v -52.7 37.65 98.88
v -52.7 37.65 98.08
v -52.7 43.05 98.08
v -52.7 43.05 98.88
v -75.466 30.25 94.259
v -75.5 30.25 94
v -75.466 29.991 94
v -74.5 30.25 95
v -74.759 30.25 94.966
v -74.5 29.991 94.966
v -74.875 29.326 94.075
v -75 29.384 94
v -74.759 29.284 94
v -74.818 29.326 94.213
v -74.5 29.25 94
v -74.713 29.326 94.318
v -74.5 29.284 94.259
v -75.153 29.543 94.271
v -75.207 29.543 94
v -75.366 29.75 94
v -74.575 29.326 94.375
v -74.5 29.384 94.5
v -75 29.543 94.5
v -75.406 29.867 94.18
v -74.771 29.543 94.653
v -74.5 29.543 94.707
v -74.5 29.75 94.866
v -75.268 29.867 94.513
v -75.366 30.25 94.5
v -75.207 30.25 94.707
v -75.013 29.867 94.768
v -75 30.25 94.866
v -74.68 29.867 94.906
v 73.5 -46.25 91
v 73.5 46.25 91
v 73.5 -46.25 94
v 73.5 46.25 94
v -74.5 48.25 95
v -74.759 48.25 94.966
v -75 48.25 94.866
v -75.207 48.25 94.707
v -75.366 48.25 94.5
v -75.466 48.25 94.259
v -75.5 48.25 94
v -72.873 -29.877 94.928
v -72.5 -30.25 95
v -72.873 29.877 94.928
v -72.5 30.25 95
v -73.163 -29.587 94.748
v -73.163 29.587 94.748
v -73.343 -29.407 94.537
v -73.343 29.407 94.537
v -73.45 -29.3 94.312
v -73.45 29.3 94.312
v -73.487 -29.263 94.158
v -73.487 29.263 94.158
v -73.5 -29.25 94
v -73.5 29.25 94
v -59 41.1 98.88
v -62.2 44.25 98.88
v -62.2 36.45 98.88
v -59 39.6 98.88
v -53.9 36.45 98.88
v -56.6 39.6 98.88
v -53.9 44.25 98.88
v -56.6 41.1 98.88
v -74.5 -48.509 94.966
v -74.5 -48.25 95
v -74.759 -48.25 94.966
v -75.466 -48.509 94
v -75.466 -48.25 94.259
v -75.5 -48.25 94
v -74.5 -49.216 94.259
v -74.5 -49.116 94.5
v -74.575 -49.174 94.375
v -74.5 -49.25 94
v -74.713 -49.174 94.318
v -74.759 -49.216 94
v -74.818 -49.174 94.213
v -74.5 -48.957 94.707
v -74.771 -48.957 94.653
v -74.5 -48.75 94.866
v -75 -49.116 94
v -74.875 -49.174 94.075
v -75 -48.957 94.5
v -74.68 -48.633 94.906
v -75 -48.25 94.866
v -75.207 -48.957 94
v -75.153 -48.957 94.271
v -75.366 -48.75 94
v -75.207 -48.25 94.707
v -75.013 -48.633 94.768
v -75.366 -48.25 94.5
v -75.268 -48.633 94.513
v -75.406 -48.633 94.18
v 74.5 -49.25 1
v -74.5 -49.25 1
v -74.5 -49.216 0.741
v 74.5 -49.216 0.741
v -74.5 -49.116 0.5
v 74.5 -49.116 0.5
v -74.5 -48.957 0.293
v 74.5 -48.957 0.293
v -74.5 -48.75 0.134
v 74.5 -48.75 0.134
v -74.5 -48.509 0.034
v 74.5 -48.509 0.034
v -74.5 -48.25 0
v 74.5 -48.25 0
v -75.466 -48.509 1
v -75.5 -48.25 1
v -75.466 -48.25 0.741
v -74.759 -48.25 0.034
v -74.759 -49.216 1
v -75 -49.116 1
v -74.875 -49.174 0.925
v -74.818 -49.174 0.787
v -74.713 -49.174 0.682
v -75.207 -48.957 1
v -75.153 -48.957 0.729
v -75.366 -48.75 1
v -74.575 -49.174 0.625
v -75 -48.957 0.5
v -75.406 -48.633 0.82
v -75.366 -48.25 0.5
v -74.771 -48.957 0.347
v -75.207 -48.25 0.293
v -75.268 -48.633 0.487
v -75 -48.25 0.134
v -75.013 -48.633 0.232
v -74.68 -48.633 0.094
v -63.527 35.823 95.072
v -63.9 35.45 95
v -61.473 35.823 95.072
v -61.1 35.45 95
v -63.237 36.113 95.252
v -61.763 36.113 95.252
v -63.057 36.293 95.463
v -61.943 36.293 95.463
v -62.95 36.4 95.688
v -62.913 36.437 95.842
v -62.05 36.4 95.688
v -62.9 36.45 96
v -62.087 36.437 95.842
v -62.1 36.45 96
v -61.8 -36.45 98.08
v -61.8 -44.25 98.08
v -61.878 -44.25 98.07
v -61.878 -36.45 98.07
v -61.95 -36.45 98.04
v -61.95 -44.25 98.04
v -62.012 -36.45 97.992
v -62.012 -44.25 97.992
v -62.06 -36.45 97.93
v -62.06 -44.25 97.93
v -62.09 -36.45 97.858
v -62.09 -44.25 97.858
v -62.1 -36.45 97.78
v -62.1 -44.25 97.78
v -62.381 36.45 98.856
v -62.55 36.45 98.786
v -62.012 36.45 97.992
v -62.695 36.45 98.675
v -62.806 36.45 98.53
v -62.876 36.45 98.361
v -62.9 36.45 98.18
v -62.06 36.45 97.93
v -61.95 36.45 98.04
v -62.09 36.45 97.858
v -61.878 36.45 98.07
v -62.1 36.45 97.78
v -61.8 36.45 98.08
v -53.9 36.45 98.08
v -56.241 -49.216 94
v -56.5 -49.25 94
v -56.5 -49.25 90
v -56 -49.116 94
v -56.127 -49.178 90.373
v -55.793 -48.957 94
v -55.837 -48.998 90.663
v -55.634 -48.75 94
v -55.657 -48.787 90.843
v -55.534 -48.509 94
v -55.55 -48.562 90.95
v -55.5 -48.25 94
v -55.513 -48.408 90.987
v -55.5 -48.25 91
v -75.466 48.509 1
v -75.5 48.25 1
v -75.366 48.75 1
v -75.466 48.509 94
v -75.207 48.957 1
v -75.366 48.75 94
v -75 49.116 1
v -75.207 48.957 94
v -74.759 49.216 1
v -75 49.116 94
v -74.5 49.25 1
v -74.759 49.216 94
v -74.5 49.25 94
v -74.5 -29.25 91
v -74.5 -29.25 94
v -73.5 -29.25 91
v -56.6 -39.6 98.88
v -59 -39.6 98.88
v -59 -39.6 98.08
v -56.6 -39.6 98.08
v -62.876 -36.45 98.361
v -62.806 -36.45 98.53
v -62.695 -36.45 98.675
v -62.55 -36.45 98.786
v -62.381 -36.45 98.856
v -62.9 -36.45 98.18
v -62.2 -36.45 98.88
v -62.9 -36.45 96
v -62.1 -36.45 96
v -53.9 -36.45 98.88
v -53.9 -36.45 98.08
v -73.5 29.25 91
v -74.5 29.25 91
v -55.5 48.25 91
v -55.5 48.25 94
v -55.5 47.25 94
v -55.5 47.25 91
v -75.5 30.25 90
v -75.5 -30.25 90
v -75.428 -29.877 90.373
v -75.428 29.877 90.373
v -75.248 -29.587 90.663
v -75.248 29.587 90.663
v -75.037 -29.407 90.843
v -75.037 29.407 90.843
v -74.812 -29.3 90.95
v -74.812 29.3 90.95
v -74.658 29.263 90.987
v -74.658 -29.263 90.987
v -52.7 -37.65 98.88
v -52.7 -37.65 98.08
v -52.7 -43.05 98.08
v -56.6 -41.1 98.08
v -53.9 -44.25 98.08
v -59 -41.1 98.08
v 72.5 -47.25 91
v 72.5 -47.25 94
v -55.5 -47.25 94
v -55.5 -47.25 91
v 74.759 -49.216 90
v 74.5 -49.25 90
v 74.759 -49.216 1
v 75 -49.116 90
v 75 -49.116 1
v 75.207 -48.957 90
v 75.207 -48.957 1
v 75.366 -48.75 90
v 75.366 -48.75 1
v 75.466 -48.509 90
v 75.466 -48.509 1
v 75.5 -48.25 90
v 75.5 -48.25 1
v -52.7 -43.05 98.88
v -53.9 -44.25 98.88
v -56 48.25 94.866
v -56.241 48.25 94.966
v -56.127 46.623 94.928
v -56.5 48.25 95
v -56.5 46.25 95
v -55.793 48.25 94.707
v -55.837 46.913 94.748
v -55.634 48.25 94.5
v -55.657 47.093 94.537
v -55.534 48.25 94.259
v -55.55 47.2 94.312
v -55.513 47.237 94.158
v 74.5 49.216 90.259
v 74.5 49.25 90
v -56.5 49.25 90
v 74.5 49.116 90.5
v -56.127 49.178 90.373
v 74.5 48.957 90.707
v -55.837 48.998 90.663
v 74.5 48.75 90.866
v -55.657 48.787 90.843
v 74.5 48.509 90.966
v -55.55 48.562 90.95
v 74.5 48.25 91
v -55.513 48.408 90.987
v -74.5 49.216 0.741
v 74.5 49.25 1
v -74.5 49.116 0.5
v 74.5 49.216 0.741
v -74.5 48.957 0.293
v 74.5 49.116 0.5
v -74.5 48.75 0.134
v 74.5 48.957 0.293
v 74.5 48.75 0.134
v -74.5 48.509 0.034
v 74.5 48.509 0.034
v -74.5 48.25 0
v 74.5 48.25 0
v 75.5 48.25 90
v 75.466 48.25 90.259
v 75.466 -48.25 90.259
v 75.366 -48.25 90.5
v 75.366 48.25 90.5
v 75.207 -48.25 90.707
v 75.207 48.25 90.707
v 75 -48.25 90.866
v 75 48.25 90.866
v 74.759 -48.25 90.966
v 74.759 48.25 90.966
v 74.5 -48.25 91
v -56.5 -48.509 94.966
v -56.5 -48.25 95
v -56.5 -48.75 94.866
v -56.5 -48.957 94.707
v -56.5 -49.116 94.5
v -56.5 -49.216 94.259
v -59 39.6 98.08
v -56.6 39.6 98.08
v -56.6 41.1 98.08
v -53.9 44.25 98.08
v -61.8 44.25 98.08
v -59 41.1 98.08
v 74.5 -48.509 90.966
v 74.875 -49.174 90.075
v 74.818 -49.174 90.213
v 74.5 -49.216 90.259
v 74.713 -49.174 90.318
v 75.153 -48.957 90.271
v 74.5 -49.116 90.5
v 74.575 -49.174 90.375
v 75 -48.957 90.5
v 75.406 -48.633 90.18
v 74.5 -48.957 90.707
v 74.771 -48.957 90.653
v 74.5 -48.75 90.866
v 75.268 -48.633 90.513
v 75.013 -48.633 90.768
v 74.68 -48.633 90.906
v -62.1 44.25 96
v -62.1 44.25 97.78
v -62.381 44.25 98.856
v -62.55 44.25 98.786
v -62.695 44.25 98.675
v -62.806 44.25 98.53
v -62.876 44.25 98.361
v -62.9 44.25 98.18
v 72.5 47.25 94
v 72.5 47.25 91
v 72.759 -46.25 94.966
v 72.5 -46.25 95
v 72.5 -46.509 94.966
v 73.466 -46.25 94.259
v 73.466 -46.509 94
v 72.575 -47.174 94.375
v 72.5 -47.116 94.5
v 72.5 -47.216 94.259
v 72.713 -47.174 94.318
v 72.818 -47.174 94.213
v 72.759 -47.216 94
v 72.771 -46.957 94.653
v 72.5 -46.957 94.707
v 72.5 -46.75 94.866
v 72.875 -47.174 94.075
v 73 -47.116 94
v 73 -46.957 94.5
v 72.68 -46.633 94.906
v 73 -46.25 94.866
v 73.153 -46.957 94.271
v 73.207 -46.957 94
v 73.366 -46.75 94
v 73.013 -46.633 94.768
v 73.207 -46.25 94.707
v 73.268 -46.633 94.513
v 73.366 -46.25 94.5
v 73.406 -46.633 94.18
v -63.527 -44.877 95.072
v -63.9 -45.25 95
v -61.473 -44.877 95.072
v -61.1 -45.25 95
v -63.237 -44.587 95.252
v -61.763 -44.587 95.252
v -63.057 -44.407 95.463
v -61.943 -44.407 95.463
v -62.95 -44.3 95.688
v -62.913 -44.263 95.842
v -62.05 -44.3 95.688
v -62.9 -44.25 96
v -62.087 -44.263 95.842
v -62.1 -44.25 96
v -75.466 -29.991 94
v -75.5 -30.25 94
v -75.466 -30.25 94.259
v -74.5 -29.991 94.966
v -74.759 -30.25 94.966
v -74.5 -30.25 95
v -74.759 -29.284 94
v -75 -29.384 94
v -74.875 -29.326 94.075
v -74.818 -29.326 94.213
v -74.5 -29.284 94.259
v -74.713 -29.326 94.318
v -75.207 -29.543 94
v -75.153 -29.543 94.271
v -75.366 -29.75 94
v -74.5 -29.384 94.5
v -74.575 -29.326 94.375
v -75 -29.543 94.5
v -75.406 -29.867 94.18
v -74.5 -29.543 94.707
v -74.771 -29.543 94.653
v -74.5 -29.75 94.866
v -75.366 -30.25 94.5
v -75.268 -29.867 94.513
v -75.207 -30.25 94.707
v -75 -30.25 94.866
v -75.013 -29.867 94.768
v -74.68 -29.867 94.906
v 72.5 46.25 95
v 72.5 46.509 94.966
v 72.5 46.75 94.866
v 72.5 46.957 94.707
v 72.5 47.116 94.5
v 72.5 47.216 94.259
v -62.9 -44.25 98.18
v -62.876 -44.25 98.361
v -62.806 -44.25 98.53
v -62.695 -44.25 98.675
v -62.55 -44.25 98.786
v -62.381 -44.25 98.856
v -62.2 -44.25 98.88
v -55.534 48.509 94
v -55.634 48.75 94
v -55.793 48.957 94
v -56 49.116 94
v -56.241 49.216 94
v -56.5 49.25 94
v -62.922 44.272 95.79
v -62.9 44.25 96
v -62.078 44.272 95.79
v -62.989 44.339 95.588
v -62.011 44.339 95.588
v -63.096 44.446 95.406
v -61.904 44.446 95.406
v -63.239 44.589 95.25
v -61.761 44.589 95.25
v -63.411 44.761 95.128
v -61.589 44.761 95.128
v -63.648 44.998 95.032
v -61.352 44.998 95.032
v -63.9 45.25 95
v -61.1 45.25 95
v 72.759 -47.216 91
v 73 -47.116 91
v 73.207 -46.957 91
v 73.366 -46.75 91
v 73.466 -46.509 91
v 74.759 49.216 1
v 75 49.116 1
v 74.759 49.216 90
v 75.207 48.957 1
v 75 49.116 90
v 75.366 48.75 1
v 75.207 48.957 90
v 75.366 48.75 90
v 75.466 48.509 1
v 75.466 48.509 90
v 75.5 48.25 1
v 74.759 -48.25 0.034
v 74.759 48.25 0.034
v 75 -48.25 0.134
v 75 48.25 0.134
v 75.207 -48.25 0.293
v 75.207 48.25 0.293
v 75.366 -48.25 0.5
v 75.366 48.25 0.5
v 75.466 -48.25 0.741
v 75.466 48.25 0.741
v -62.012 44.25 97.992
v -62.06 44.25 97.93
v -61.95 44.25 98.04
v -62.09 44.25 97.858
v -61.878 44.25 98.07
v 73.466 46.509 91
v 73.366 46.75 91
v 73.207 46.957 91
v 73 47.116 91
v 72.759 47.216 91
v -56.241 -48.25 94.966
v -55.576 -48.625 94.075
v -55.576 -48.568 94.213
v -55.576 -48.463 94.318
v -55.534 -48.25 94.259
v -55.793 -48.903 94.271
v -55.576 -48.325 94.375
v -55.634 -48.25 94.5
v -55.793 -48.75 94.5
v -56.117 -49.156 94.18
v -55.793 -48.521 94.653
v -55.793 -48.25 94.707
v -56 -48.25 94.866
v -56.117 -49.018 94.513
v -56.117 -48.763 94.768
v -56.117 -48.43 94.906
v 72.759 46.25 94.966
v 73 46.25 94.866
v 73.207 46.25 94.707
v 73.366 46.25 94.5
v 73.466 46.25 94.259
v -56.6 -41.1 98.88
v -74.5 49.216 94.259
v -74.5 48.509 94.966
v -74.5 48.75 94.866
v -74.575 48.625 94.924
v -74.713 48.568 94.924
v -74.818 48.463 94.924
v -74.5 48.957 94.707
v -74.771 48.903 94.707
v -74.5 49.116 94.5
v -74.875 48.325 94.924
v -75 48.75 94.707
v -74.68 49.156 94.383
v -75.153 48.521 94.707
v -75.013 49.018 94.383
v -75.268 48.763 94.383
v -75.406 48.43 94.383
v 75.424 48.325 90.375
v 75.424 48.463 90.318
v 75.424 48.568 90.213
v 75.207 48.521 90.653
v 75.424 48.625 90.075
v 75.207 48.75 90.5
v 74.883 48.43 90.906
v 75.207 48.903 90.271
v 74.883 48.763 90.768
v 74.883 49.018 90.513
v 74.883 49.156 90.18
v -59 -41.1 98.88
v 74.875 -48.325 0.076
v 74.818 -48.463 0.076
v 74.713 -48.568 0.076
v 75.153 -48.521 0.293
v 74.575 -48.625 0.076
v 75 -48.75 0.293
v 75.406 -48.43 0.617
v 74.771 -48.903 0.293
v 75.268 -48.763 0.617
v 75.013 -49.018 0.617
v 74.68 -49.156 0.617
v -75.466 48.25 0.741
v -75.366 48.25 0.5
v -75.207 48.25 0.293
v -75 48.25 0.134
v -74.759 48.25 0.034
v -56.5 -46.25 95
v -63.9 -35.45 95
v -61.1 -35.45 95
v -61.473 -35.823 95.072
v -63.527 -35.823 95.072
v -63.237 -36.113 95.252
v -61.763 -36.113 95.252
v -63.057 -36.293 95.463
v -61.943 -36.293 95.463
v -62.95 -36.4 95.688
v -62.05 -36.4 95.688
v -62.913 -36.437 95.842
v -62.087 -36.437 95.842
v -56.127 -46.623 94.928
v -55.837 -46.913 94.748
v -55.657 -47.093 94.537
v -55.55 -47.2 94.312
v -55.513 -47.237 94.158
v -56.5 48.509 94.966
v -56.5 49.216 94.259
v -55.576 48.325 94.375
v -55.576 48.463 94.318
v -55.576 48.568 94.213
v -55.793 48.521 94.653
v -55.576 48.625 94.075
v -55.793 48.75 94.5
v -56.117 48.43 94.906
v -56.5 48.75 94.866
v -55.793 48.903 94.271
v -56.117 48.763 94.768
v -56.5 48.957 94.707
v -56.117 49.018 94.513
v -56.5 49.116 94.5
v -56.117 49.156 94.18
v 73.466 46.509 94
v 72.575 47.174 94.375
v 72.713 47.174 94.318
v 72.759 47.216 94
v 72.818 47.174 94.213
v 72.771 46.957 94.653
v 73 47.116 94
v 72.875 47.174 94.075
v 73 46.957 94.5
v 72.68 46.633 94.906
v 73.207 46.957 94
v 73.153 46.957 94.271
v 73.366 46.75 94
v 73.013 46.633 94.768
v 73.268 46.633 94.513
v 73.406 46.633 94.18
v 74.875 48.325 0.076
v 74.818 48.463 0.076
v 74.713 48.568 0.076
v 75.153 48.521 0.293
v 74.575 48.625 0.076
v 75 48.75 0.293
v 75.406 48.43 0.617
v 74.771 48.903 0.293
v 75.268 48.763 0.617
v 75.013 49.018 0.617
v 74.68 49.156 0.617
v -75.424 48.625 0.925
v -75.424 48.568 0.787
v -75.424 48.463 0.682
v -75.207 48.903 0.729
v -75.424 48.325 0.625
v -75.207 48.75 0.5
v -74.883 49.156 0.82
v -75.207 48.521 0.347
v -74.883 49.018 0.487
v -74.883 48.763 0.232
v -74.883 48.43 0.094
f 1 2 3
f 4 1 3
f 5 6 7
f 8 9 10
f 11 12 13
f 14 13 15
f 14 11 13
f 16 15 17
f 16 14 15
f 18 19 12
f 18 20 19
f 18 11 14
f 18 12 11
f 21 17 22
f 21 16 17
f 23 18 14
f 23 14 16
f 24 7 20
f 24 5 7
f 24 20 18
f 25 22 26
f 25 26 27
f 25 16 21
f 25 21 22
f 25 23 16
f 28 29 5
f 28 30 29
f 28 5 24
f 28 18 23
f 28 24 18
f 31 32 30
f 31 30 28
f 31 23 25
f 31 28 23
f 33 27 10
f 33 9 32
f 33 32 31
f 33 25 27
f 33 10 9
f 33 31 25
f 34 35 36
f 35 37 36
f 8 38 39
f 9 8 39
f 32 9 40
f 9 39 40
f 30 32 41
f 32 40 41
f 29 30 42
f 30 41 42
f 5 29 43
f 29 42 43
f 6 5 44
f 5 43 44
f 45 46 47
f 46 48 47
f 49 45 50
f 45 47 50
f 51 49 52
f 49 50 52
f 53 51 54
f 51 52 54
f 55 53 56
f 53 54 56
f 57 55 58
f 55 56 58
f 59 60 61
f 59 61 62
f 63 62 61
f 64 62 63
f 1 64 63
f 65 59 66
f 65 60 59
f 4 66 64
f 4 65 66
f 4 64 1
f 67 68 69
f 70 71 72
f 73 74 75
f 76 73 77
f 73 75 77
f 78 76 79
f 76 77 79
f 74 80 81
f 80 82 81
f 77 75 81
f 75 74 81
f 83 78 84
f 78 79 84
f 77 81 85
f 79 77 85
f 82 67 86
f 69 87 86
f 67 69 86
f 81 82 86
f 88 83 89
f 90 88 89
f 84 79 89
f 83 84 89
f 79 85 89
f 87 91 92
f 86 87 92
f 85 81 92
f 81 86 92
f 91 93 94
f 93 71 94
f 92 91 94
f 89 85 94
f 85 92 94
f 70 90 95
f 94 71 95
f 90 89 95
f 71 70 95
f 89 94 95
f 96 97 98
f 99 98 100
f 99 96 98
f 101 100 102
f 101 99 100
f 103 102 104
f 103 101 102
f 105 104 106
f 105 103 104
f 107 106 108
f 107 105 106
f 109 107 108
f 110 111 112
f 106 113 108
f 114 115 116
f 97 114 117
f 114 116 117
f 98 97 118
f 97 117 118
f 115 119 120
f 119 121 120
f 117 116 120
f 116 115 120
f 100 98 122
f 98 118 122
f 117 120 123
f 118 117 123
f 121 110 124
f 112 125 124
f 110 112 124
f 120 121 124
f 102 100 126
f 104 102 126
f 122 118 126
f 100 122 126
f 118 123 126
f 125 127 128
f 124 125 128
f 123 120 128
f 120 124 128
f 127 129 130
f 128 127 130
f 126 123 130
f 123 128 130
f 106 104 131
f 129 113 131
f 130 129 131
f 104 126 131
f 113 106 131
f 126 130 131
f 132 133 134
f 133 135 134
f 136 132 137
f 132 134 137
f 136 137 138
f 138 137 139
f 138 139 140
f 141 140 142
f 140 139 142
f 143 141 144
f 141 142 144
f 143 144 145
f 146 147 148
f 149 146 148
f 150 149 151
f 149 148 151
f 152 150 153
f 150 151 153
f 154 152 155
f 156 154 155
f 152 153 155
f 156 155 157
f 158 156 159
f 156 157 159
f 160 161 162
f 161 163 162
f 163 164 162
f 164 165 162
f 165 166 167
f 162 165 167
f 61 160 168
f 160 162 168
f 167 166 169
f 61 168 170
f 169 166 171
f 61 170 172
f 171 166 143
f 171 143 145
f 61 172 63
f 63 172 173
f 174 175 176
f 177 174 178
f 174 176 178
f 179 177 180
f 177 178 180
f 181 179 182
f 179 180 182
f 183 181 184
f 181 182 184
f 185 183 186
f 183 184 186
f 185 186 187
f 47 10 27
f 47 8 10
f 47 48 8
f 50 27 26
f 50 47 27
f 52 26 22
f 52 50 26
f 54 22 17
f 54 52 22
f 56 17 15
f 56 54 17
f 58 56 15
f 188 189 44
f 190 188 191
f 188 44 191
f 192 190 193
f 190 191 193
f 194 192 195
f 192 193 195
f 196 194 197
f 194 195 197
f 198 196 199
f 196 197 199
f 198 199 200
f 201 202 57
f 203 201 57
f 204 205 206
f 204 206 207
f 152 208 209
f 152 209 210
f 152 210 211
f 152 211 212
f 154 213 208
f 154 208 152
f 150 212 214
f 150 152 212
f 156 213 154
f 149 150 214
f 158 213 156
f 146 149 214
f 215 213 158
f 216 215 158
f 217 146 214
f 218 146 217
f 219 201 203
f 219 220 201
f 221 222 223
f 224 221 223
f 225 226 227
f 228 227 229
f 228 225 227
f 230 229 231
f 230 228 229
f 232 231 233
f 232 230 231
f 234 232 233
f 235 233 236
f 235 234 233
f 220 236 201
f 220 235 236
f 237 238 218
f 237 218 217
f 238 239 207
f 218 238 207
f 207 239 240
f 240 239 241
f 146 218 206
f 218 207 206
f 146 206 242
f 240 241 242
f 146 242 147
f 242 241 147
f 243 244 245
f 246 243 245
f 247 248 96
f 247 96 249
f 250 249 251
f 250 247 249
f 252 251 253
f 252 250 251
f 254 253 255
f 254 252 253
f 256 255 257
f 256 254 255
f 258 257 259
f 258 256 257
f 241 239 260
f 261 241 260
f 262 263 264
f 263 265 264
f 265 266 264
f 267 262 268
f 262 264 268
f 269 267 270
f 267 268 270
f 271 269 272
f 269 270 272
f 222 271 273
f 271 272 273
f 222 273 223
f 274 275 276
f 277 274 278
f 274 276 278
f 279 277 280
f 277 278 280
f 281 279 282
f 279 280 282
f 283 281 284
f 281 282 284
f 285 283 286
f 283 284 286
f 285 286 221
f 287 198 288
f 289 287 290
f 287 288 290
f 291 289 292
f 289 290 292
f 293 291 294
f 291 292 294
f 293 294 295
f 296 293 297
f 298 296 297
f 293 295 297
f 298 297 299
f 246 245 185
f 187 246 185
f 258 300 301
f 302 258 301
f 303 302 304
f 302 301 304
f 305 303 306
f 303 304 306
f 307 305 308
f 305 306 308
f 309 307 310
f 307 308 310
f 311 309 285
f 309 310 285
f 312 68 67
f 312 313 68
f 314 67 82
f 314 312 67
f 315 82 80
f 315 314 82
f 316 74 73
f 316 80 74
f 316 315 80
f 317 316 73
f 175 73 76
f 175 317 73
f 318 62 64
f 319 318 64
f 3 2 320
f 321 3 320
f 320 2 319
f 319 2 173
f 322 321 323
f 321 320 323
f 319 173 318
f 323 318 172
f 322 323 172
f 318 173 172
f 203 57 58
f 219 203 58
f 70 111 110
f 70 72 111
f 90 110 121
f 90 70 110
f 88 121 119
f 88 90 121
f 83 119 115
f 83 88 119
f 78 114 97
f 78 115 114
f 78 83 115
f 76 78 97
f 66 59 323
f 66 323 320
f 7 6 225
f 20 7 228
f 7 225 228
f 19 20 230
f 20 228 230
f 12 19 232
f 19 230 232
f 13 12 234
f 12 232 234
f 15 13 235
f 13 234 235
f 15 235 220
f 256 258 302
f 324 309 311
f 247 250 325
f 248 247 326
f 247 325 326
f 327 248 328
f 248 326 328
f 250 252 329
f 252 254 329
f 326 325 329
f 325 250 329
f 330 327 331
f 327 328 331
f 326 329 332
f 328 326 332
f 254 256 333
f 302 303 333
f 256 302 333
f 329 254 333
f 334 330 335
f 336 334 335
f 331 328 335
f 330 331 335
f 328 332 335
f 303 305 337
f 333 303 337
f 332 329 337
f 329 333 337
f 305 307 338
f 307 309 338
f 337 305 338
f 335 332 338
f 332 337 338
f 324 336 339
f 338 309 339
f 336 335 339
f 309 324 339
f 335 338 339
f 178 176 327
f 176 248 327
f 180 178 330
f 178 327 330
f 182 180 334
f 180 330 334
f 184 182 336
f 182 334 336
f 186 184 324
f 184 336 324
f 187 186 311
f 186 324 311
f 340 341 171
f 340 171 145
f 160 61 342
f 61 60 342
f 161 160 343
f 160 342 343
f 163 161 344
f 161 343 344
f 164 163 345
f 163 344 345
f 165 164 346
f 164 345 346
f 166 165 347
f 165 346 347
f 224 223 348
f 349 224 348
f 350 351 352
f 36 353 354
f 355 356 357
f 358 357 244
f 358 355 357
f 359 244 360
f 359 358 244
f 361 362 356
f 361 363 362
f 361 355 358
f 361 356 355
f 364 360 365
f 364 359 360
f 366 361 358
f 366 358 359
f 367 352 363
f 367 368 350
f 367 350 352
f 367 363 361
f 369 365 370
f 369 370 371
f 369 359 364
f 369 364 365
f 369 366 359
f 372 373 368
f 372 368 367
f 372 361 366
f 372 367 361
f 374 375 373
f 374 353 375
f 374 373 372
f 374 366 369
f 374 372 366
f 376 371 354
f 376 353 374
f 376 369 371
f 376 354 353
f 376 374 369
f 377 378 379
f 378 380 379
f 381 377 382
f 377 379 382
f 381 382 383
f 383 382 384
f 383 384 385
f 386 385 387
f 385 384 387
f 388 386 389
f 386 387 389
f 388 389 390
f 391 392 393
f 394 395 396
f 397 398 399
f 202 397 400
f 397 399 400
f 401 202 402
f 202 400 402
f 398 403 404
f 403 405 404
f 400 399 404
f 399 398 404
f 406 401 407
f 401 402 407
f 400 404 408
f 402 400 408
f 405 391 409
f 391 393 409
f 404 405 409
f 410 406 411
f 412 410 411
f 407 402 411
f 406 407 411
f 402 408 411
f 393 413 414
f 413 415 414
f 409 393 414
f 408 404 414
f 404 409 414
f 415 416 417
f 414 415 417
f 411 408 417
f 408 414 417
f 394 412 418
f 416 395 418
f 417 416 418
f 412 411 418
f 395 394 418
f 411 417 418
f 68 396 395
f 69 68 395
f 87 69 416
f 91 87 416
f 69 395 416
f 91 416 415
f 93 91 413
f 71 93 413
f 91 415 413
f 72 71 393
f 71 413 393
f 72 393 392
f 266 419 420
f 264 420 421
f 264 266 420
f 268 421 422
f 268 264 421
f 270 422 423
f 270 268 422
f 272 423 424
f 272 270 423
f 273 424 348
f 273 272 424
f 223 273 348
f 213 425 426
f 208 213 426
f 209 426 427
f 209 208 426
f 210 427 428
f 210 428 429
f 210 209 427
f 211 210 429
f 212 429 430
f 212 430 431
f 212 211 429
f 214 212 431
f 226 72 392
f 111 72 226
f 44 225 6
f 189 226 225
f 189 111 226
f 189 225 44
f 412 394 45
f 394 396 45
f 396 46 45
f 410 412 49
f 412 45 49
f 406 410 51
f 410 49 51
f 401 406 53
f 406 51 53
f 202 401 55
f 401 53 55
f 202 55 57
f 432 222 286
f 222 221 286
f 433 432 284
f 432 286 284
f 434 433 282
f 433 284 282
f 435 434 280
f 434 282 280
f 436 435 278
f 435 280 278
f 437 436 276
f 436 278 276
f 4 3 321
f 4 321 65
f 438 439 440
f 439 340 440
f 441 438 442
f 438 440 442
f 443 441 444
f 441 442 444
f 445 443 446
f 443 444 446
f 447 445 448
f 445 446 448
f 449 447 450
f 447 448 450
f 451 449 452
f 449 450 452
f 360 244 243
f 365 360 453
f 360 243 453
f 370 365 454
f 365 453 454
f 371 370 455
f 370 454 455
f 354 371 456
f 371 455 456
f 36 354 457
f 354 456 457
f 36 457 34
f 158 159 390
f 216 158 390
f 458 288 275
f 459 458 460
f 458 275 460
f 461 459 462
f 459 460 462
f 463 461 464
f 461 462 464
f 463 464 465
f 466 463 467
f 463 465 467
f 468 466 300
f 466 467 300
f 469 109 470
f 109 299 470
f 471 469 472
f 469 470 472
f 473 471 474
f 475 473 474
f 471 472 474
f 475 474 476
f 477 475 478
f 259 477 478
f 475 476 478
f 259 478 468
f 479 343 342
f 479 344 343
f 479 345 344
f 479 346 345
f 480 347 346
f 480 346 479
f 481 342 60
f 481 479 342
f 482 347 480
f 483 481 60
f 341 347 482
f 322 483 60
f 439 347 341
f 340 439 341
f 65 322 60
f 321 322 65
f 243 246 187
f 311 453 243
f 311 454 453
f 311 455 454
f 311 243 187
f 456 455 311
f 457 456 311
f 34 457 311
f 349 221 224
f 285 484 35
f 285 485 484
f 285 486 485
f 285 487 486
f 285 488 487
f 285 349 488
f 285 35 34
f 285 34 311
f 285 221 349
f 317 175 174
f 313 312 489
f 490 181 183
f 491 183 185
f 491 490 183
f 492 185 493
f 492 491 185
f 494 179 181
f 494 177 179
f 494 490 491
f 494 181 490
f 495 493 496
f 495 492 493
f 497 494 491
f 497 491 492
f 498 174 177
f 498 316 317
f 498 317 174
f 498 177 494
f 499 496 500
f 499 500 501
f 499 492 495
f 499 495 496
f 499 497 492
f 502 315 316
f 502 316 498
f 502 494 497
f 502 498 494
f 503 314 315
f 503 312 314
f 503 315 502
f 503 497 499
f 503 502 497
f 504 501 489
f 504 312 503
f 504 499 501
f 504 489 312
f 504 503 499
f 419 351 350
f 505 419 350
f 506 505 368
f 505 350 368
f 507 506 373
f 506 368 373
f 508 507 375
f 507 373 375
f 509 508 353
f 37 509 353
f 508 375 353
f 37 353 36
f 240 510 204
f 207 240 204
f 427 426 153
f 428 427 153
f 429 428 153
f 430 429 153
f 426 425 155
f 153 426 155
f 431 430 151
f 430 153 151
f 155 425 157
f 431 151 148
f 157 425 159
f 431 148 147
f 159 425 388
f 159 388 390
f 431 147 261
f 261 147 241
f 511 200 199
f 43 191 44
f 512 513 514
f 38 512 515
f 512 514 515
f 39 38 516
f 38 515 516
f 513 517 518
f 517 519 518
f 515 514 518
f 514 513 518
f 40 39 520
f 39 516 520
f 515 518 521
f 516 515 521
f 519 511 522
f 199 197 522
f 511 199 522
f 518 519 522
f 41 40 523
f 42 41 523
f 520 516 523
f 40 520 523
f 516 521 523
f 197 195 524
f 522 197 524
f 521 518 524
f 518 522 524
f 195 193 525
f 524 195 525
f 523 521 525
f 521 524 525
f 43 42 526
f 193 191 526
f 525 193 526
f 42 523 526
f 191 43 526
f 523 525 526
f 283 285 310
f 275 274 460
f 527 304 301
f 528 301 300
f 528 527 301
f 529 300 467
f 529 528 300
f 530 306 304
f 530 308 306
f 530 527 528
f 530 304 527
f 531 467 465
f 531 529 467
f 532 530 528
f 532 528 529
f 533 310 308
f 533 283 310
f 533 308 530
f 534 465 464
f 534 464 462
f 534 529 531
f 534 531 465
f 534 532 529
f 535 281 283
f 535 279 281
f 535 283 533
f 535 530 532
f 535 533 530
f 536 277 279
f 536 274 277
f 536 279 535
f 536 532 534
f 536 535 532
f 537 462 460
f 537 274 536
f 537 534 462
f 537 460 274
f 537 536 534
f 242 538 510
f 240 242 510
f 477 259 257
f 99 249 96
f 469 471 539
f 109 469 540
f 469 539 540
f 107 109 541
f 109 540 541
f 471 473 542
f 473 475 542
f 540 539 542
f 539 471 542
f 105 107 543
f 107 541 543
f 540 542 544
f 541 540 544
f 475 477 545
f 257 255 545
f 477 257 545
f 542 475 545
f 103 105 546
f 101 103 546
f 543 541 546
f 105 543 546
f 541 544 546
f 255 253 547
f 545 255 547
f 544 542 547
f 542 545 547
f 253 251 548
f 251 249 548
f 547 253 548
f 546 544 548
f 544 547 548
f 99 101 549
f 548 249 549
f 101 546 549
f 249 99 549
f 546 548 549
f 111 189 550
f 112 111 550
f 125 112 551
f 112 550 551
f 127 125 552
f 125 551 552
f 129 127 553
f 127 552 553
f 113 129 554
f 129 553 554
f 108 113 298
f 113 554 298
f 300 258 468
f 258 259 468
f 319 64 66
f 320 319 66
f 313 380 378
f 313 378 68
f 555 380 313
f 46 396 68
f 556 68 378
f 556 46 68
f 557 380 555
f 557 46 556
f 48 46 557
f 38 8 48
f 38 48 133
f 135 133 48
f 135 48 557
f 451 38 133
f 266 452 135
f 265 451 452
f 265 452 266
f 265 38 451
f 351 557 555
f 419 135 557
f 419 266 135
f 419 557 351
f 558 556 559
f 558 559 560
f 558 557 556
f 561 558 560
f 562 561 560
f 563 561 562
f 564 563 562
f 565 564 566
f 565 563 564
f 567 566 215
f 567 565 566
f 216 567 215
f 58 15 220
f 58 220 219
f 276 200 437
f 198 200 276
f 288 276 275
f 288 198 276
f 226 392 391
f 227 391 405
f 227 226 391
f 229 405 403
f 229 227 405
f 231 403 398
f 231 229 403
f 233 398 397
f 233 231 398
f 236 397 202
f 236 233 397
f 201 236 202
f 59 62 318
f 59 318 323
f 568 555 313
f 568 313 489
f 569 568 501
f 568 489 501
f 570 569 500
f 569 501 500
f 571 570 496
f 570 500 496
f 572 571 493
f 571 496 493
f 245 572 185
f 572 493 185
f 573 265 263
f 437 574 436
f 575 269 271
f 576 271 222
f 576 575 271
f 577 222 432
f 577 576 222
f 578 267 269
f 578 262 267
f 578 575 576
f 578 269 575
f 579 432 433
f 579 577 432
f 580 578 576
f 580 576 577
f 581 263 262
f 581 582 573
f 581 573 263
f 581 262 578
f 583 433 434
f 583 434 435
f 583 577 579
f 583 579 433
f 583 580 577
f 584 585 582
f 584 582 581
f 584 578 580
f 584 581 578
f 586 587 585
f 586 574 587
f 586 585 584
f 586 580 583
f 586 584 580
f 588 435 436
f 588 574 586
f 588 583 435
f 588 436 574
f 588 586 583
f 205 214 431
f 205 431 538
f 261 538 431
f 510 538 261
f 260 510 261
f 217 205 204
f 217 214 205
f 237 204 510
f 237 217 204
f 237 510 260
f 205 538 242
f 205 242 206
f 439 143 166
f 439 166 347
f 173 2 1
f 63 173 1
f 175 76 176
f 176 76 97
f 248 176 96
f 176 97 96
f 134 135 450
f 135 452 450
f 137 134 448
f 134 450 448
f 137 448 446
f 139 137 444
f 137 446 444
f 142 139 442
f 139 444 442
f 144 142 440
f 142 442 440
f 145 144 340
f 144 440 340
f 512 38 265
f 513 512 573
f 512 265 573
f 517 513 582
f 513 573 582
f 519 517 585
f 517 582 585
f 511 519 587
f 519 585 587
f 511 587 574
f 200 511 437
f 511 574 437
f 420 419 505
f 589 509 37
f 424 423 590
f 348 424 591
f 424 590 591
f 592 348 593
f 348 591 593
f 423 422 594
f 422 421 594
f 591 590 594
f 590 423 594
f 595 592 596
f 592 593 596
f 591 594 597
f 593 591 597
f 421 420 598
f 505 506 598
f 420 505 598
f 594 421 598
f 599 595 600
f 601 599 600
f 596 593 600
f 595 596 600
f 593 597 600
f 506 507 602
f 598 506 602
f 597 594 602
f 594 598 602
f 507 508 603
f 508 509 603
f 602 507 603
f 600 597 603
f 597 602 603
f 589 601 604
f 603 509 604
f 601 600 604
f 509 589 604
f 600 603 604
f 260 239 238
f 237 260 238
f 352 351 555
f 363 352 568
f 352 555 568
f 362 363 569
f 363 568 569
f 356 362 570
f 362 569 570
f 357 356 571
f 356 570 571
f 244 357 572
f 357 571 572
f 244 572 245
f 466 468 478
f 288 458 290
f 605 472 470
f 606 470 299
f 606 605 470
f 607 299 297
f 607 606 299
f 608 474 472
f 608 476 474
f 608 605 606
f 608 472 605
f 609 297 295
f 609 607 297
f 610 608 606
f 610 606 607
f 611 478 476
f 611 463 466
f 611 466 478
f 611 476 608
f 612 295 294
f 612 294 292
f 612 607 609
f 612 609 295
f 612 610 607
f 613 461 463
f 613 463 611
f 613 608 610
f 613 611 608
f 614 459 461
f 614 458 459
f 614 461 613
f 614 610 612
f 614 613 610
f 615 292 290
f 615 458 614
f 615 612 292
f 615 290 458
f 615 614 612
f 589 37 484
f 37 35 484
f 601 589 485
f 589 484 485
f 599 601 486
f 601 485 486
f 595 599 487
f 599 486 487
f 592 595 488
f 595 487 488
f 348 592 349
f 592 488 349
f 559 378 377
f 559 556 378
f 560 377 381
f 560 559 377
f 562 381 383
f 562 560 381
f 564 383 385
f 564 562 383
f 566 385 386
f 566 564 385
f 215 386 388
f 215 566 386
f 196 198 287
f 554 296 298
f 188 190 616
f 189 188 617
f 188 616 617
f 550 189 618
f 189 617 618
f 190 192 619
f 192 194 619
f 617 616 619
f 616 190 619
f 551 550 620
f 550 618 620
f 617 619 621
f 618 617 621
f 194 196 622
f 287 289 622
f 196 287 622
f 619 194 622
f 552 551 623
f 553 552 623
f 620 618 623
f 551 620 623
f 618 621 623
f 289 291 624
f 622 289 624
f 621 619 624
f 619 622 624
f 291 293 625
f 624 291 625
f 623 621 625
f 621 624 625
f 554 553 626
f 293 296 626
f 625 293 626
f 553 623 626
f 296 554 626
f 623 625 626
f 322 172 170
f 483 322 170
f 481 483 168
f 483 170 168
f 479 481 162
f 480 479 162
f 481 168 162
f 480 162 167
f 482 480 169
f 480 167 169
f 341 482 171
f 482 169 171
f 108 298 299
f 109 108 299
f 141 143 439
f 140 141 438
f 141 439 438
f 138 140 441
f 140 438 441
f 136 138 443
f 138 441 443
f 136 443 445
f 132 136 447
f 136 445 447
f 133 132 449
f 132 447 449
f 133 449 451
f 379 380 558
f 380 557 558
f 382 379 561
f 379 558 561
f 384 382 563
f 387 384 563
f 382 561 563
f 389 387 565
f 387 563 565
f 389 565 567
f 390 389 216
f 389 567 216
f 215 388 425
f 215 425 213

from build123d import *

# Parameters (mm, degrees)
F0_W      = 151
F0_H      = 98.5
F1_DEPTH  = 95
F2_W      = 2
F2_H      = 58.5
F3_DEPTH  = 4
F4_W      = 10.2
F4_H      = 7.8
F5_DEPTH  = 3.88
F7_DEPTH  = 93.501
F8_W      = 2.4
F8_H      = 1.5
F9_DEPTH  = 0.8
F10_W     = 2.4
F10_H     = 1.5
F11_DEPTH = 2
F12_SIZE  = 1.2
F13_R     = 0.7
F14_R     = 1


with BuildPart() as f1:
    # F0 (on Top) → F1 (new body)
    with BuildSketch(Plane.XY):
        Rectangle(F0_W, F0_H)
    extrude(amount=F1_DEPTH)

    # F2 (on face) → F3 (cut)
    with BuildSketch(Plane.XY.offset(95)):
        Polygon((-55.5, -47.25), (-55.5, -49.25), (75.5, -49.25), (75.5, 0), (73.5, 0), (73.5, -47.25), align=None)
        Polygon((75.5, 49.25), (-55.5, 49.25), (-55.5, 47.25), (73.5, 47.25), (73.5, 0), (75.5, 0), align=None)
        with Locations((-74.5, 0)):
            Rectangle(F2_W, F2_H)
    extrude(amount=-F3_DEPTH, mode=Mode.SUBTRACT)

    # F4 (on face) → F5 (join)
    with BuildSketch(Plane.XY.offset(95)):
        with Locations((-57.8, -40.35)):
            Rectangle(F4_W, F4_H)
        with Locations((-57.8, 40.35)):
            Rectangle(F4_W, F4_H)
    extrude(amount=F5_DEPTH)

    # F6 (on face) → F7 (cut, through all)
    with BuildSketch(Plane.XZ.offset(44.25)):
        with BuildLine():
            Line((-62.1, 97.78), (-62.1, 95))
            Line((-62.1, 95), (-52.7, 95))
            Line((-52.7, 95), (-52.7, 98.08))
            Line((-52.7, 98.08), (-61.8, 98.08))
            ThreePointArc((-61.8, 98.08), (-62.0121320344, 97.9921320344), (-62.1, 97.78))
        make_face()
    extrude(amount=-F7_DEPTH, mode=Mode.SUBTRACT)

    # F8 (on face) → F9 (cut, through all)
    with BuildSketch(Plane.XY.offset(98.88)):
        with Locations((-57.8, 40.35)):
            Rectangle(F8_W, F8_H)
    extrude(amount=-F9_DEPTH, mode=Mode.SUBTRACT)

    # F10 (on face) → F11 (cut)
    with BuildSketch(Plane.XY.offset(98.88)):
        with Locations((-57.8, -40.35)):
            Rectangle(F10_W, F10_H)
    extrude(amount=-F11_DEPTH, mode=Mode.SUBTRACT)

    # F12
    f12_edges = [f1.edges().sort_by_distance(p)[0] for p in [
        (-52.7, -44.25, 98.48),
        (-52.7, -36.45, 98.48),
        (-52.7, 36.45, 98.48),
        (-52.7, 44.25, 98.48),
    ]]
    chamfer(f12_edges, length=F12_SIZE)

    # F13
    f13_edges = [f1.edges().sort_by_distance(p)[0] for p in [
        (-62.9, -40.35, 98.88),
        (-62.9, 40.35, 98.88),
    ]]
    fillet(f13_edges, radius=F13_R)

    # F14
    f14_edges = [f1.edges().sort_by_distance(p)[0] for p in [
        (73.5, 0, 95),
        (9, 47.25, 95),
        (10, 49.25, 91),
        (75.5, 0, 91),
        (75.5, 49.25, 45.5),
        (73.5, 47.25, 93),
        (75.5, -49.25, 45.5),
        (75.5, 0, 0),
        (0, 49.25, 0),
        (-75.5, 49.25, 47.5),
        (-65.5, 49.25, 95),
        (-55.5, 48.25, 95),
        (-55.5, 49.25, 93),
        (-75.5, 39.25, 95),
        (-73.5, 0, 95),
        (-75.5, 0, 91),
        (-75.5, -39.25, 95),
        (-65.5, -49.25, 95),
        (9, -47.25, 95),
        (-75.5, 0, 0),
        (-75.5, -49.25, 47.5),
        (0, -49.25, 0),
        (10, -49.25, 91),
        (-55.5, -49.25, 93),
        (73.5, -47.25, 93),
        (-75.5, -29.25, 93),
        (-75.5, 29.25, 93),
        (-74.5, 29.25, 95),
        (-62.5, 44.25, 95),
        (-62.1, 40.35, 95),
        (-62.5, 36.45, 95),
        (-62.9, 40.35, 95),
        (-62.5, -36.45, 95),
        (-62.1, -40.35, 95),
        (-62.5, -44.25, 95),
        (-62.9, -40.35, 95),
        (-74.5, -29.25, 95),
        (-55.5, -48.25, 95),
    ]]
    fillet(f14_edges, radius=F14_R)


solid = f1.part
